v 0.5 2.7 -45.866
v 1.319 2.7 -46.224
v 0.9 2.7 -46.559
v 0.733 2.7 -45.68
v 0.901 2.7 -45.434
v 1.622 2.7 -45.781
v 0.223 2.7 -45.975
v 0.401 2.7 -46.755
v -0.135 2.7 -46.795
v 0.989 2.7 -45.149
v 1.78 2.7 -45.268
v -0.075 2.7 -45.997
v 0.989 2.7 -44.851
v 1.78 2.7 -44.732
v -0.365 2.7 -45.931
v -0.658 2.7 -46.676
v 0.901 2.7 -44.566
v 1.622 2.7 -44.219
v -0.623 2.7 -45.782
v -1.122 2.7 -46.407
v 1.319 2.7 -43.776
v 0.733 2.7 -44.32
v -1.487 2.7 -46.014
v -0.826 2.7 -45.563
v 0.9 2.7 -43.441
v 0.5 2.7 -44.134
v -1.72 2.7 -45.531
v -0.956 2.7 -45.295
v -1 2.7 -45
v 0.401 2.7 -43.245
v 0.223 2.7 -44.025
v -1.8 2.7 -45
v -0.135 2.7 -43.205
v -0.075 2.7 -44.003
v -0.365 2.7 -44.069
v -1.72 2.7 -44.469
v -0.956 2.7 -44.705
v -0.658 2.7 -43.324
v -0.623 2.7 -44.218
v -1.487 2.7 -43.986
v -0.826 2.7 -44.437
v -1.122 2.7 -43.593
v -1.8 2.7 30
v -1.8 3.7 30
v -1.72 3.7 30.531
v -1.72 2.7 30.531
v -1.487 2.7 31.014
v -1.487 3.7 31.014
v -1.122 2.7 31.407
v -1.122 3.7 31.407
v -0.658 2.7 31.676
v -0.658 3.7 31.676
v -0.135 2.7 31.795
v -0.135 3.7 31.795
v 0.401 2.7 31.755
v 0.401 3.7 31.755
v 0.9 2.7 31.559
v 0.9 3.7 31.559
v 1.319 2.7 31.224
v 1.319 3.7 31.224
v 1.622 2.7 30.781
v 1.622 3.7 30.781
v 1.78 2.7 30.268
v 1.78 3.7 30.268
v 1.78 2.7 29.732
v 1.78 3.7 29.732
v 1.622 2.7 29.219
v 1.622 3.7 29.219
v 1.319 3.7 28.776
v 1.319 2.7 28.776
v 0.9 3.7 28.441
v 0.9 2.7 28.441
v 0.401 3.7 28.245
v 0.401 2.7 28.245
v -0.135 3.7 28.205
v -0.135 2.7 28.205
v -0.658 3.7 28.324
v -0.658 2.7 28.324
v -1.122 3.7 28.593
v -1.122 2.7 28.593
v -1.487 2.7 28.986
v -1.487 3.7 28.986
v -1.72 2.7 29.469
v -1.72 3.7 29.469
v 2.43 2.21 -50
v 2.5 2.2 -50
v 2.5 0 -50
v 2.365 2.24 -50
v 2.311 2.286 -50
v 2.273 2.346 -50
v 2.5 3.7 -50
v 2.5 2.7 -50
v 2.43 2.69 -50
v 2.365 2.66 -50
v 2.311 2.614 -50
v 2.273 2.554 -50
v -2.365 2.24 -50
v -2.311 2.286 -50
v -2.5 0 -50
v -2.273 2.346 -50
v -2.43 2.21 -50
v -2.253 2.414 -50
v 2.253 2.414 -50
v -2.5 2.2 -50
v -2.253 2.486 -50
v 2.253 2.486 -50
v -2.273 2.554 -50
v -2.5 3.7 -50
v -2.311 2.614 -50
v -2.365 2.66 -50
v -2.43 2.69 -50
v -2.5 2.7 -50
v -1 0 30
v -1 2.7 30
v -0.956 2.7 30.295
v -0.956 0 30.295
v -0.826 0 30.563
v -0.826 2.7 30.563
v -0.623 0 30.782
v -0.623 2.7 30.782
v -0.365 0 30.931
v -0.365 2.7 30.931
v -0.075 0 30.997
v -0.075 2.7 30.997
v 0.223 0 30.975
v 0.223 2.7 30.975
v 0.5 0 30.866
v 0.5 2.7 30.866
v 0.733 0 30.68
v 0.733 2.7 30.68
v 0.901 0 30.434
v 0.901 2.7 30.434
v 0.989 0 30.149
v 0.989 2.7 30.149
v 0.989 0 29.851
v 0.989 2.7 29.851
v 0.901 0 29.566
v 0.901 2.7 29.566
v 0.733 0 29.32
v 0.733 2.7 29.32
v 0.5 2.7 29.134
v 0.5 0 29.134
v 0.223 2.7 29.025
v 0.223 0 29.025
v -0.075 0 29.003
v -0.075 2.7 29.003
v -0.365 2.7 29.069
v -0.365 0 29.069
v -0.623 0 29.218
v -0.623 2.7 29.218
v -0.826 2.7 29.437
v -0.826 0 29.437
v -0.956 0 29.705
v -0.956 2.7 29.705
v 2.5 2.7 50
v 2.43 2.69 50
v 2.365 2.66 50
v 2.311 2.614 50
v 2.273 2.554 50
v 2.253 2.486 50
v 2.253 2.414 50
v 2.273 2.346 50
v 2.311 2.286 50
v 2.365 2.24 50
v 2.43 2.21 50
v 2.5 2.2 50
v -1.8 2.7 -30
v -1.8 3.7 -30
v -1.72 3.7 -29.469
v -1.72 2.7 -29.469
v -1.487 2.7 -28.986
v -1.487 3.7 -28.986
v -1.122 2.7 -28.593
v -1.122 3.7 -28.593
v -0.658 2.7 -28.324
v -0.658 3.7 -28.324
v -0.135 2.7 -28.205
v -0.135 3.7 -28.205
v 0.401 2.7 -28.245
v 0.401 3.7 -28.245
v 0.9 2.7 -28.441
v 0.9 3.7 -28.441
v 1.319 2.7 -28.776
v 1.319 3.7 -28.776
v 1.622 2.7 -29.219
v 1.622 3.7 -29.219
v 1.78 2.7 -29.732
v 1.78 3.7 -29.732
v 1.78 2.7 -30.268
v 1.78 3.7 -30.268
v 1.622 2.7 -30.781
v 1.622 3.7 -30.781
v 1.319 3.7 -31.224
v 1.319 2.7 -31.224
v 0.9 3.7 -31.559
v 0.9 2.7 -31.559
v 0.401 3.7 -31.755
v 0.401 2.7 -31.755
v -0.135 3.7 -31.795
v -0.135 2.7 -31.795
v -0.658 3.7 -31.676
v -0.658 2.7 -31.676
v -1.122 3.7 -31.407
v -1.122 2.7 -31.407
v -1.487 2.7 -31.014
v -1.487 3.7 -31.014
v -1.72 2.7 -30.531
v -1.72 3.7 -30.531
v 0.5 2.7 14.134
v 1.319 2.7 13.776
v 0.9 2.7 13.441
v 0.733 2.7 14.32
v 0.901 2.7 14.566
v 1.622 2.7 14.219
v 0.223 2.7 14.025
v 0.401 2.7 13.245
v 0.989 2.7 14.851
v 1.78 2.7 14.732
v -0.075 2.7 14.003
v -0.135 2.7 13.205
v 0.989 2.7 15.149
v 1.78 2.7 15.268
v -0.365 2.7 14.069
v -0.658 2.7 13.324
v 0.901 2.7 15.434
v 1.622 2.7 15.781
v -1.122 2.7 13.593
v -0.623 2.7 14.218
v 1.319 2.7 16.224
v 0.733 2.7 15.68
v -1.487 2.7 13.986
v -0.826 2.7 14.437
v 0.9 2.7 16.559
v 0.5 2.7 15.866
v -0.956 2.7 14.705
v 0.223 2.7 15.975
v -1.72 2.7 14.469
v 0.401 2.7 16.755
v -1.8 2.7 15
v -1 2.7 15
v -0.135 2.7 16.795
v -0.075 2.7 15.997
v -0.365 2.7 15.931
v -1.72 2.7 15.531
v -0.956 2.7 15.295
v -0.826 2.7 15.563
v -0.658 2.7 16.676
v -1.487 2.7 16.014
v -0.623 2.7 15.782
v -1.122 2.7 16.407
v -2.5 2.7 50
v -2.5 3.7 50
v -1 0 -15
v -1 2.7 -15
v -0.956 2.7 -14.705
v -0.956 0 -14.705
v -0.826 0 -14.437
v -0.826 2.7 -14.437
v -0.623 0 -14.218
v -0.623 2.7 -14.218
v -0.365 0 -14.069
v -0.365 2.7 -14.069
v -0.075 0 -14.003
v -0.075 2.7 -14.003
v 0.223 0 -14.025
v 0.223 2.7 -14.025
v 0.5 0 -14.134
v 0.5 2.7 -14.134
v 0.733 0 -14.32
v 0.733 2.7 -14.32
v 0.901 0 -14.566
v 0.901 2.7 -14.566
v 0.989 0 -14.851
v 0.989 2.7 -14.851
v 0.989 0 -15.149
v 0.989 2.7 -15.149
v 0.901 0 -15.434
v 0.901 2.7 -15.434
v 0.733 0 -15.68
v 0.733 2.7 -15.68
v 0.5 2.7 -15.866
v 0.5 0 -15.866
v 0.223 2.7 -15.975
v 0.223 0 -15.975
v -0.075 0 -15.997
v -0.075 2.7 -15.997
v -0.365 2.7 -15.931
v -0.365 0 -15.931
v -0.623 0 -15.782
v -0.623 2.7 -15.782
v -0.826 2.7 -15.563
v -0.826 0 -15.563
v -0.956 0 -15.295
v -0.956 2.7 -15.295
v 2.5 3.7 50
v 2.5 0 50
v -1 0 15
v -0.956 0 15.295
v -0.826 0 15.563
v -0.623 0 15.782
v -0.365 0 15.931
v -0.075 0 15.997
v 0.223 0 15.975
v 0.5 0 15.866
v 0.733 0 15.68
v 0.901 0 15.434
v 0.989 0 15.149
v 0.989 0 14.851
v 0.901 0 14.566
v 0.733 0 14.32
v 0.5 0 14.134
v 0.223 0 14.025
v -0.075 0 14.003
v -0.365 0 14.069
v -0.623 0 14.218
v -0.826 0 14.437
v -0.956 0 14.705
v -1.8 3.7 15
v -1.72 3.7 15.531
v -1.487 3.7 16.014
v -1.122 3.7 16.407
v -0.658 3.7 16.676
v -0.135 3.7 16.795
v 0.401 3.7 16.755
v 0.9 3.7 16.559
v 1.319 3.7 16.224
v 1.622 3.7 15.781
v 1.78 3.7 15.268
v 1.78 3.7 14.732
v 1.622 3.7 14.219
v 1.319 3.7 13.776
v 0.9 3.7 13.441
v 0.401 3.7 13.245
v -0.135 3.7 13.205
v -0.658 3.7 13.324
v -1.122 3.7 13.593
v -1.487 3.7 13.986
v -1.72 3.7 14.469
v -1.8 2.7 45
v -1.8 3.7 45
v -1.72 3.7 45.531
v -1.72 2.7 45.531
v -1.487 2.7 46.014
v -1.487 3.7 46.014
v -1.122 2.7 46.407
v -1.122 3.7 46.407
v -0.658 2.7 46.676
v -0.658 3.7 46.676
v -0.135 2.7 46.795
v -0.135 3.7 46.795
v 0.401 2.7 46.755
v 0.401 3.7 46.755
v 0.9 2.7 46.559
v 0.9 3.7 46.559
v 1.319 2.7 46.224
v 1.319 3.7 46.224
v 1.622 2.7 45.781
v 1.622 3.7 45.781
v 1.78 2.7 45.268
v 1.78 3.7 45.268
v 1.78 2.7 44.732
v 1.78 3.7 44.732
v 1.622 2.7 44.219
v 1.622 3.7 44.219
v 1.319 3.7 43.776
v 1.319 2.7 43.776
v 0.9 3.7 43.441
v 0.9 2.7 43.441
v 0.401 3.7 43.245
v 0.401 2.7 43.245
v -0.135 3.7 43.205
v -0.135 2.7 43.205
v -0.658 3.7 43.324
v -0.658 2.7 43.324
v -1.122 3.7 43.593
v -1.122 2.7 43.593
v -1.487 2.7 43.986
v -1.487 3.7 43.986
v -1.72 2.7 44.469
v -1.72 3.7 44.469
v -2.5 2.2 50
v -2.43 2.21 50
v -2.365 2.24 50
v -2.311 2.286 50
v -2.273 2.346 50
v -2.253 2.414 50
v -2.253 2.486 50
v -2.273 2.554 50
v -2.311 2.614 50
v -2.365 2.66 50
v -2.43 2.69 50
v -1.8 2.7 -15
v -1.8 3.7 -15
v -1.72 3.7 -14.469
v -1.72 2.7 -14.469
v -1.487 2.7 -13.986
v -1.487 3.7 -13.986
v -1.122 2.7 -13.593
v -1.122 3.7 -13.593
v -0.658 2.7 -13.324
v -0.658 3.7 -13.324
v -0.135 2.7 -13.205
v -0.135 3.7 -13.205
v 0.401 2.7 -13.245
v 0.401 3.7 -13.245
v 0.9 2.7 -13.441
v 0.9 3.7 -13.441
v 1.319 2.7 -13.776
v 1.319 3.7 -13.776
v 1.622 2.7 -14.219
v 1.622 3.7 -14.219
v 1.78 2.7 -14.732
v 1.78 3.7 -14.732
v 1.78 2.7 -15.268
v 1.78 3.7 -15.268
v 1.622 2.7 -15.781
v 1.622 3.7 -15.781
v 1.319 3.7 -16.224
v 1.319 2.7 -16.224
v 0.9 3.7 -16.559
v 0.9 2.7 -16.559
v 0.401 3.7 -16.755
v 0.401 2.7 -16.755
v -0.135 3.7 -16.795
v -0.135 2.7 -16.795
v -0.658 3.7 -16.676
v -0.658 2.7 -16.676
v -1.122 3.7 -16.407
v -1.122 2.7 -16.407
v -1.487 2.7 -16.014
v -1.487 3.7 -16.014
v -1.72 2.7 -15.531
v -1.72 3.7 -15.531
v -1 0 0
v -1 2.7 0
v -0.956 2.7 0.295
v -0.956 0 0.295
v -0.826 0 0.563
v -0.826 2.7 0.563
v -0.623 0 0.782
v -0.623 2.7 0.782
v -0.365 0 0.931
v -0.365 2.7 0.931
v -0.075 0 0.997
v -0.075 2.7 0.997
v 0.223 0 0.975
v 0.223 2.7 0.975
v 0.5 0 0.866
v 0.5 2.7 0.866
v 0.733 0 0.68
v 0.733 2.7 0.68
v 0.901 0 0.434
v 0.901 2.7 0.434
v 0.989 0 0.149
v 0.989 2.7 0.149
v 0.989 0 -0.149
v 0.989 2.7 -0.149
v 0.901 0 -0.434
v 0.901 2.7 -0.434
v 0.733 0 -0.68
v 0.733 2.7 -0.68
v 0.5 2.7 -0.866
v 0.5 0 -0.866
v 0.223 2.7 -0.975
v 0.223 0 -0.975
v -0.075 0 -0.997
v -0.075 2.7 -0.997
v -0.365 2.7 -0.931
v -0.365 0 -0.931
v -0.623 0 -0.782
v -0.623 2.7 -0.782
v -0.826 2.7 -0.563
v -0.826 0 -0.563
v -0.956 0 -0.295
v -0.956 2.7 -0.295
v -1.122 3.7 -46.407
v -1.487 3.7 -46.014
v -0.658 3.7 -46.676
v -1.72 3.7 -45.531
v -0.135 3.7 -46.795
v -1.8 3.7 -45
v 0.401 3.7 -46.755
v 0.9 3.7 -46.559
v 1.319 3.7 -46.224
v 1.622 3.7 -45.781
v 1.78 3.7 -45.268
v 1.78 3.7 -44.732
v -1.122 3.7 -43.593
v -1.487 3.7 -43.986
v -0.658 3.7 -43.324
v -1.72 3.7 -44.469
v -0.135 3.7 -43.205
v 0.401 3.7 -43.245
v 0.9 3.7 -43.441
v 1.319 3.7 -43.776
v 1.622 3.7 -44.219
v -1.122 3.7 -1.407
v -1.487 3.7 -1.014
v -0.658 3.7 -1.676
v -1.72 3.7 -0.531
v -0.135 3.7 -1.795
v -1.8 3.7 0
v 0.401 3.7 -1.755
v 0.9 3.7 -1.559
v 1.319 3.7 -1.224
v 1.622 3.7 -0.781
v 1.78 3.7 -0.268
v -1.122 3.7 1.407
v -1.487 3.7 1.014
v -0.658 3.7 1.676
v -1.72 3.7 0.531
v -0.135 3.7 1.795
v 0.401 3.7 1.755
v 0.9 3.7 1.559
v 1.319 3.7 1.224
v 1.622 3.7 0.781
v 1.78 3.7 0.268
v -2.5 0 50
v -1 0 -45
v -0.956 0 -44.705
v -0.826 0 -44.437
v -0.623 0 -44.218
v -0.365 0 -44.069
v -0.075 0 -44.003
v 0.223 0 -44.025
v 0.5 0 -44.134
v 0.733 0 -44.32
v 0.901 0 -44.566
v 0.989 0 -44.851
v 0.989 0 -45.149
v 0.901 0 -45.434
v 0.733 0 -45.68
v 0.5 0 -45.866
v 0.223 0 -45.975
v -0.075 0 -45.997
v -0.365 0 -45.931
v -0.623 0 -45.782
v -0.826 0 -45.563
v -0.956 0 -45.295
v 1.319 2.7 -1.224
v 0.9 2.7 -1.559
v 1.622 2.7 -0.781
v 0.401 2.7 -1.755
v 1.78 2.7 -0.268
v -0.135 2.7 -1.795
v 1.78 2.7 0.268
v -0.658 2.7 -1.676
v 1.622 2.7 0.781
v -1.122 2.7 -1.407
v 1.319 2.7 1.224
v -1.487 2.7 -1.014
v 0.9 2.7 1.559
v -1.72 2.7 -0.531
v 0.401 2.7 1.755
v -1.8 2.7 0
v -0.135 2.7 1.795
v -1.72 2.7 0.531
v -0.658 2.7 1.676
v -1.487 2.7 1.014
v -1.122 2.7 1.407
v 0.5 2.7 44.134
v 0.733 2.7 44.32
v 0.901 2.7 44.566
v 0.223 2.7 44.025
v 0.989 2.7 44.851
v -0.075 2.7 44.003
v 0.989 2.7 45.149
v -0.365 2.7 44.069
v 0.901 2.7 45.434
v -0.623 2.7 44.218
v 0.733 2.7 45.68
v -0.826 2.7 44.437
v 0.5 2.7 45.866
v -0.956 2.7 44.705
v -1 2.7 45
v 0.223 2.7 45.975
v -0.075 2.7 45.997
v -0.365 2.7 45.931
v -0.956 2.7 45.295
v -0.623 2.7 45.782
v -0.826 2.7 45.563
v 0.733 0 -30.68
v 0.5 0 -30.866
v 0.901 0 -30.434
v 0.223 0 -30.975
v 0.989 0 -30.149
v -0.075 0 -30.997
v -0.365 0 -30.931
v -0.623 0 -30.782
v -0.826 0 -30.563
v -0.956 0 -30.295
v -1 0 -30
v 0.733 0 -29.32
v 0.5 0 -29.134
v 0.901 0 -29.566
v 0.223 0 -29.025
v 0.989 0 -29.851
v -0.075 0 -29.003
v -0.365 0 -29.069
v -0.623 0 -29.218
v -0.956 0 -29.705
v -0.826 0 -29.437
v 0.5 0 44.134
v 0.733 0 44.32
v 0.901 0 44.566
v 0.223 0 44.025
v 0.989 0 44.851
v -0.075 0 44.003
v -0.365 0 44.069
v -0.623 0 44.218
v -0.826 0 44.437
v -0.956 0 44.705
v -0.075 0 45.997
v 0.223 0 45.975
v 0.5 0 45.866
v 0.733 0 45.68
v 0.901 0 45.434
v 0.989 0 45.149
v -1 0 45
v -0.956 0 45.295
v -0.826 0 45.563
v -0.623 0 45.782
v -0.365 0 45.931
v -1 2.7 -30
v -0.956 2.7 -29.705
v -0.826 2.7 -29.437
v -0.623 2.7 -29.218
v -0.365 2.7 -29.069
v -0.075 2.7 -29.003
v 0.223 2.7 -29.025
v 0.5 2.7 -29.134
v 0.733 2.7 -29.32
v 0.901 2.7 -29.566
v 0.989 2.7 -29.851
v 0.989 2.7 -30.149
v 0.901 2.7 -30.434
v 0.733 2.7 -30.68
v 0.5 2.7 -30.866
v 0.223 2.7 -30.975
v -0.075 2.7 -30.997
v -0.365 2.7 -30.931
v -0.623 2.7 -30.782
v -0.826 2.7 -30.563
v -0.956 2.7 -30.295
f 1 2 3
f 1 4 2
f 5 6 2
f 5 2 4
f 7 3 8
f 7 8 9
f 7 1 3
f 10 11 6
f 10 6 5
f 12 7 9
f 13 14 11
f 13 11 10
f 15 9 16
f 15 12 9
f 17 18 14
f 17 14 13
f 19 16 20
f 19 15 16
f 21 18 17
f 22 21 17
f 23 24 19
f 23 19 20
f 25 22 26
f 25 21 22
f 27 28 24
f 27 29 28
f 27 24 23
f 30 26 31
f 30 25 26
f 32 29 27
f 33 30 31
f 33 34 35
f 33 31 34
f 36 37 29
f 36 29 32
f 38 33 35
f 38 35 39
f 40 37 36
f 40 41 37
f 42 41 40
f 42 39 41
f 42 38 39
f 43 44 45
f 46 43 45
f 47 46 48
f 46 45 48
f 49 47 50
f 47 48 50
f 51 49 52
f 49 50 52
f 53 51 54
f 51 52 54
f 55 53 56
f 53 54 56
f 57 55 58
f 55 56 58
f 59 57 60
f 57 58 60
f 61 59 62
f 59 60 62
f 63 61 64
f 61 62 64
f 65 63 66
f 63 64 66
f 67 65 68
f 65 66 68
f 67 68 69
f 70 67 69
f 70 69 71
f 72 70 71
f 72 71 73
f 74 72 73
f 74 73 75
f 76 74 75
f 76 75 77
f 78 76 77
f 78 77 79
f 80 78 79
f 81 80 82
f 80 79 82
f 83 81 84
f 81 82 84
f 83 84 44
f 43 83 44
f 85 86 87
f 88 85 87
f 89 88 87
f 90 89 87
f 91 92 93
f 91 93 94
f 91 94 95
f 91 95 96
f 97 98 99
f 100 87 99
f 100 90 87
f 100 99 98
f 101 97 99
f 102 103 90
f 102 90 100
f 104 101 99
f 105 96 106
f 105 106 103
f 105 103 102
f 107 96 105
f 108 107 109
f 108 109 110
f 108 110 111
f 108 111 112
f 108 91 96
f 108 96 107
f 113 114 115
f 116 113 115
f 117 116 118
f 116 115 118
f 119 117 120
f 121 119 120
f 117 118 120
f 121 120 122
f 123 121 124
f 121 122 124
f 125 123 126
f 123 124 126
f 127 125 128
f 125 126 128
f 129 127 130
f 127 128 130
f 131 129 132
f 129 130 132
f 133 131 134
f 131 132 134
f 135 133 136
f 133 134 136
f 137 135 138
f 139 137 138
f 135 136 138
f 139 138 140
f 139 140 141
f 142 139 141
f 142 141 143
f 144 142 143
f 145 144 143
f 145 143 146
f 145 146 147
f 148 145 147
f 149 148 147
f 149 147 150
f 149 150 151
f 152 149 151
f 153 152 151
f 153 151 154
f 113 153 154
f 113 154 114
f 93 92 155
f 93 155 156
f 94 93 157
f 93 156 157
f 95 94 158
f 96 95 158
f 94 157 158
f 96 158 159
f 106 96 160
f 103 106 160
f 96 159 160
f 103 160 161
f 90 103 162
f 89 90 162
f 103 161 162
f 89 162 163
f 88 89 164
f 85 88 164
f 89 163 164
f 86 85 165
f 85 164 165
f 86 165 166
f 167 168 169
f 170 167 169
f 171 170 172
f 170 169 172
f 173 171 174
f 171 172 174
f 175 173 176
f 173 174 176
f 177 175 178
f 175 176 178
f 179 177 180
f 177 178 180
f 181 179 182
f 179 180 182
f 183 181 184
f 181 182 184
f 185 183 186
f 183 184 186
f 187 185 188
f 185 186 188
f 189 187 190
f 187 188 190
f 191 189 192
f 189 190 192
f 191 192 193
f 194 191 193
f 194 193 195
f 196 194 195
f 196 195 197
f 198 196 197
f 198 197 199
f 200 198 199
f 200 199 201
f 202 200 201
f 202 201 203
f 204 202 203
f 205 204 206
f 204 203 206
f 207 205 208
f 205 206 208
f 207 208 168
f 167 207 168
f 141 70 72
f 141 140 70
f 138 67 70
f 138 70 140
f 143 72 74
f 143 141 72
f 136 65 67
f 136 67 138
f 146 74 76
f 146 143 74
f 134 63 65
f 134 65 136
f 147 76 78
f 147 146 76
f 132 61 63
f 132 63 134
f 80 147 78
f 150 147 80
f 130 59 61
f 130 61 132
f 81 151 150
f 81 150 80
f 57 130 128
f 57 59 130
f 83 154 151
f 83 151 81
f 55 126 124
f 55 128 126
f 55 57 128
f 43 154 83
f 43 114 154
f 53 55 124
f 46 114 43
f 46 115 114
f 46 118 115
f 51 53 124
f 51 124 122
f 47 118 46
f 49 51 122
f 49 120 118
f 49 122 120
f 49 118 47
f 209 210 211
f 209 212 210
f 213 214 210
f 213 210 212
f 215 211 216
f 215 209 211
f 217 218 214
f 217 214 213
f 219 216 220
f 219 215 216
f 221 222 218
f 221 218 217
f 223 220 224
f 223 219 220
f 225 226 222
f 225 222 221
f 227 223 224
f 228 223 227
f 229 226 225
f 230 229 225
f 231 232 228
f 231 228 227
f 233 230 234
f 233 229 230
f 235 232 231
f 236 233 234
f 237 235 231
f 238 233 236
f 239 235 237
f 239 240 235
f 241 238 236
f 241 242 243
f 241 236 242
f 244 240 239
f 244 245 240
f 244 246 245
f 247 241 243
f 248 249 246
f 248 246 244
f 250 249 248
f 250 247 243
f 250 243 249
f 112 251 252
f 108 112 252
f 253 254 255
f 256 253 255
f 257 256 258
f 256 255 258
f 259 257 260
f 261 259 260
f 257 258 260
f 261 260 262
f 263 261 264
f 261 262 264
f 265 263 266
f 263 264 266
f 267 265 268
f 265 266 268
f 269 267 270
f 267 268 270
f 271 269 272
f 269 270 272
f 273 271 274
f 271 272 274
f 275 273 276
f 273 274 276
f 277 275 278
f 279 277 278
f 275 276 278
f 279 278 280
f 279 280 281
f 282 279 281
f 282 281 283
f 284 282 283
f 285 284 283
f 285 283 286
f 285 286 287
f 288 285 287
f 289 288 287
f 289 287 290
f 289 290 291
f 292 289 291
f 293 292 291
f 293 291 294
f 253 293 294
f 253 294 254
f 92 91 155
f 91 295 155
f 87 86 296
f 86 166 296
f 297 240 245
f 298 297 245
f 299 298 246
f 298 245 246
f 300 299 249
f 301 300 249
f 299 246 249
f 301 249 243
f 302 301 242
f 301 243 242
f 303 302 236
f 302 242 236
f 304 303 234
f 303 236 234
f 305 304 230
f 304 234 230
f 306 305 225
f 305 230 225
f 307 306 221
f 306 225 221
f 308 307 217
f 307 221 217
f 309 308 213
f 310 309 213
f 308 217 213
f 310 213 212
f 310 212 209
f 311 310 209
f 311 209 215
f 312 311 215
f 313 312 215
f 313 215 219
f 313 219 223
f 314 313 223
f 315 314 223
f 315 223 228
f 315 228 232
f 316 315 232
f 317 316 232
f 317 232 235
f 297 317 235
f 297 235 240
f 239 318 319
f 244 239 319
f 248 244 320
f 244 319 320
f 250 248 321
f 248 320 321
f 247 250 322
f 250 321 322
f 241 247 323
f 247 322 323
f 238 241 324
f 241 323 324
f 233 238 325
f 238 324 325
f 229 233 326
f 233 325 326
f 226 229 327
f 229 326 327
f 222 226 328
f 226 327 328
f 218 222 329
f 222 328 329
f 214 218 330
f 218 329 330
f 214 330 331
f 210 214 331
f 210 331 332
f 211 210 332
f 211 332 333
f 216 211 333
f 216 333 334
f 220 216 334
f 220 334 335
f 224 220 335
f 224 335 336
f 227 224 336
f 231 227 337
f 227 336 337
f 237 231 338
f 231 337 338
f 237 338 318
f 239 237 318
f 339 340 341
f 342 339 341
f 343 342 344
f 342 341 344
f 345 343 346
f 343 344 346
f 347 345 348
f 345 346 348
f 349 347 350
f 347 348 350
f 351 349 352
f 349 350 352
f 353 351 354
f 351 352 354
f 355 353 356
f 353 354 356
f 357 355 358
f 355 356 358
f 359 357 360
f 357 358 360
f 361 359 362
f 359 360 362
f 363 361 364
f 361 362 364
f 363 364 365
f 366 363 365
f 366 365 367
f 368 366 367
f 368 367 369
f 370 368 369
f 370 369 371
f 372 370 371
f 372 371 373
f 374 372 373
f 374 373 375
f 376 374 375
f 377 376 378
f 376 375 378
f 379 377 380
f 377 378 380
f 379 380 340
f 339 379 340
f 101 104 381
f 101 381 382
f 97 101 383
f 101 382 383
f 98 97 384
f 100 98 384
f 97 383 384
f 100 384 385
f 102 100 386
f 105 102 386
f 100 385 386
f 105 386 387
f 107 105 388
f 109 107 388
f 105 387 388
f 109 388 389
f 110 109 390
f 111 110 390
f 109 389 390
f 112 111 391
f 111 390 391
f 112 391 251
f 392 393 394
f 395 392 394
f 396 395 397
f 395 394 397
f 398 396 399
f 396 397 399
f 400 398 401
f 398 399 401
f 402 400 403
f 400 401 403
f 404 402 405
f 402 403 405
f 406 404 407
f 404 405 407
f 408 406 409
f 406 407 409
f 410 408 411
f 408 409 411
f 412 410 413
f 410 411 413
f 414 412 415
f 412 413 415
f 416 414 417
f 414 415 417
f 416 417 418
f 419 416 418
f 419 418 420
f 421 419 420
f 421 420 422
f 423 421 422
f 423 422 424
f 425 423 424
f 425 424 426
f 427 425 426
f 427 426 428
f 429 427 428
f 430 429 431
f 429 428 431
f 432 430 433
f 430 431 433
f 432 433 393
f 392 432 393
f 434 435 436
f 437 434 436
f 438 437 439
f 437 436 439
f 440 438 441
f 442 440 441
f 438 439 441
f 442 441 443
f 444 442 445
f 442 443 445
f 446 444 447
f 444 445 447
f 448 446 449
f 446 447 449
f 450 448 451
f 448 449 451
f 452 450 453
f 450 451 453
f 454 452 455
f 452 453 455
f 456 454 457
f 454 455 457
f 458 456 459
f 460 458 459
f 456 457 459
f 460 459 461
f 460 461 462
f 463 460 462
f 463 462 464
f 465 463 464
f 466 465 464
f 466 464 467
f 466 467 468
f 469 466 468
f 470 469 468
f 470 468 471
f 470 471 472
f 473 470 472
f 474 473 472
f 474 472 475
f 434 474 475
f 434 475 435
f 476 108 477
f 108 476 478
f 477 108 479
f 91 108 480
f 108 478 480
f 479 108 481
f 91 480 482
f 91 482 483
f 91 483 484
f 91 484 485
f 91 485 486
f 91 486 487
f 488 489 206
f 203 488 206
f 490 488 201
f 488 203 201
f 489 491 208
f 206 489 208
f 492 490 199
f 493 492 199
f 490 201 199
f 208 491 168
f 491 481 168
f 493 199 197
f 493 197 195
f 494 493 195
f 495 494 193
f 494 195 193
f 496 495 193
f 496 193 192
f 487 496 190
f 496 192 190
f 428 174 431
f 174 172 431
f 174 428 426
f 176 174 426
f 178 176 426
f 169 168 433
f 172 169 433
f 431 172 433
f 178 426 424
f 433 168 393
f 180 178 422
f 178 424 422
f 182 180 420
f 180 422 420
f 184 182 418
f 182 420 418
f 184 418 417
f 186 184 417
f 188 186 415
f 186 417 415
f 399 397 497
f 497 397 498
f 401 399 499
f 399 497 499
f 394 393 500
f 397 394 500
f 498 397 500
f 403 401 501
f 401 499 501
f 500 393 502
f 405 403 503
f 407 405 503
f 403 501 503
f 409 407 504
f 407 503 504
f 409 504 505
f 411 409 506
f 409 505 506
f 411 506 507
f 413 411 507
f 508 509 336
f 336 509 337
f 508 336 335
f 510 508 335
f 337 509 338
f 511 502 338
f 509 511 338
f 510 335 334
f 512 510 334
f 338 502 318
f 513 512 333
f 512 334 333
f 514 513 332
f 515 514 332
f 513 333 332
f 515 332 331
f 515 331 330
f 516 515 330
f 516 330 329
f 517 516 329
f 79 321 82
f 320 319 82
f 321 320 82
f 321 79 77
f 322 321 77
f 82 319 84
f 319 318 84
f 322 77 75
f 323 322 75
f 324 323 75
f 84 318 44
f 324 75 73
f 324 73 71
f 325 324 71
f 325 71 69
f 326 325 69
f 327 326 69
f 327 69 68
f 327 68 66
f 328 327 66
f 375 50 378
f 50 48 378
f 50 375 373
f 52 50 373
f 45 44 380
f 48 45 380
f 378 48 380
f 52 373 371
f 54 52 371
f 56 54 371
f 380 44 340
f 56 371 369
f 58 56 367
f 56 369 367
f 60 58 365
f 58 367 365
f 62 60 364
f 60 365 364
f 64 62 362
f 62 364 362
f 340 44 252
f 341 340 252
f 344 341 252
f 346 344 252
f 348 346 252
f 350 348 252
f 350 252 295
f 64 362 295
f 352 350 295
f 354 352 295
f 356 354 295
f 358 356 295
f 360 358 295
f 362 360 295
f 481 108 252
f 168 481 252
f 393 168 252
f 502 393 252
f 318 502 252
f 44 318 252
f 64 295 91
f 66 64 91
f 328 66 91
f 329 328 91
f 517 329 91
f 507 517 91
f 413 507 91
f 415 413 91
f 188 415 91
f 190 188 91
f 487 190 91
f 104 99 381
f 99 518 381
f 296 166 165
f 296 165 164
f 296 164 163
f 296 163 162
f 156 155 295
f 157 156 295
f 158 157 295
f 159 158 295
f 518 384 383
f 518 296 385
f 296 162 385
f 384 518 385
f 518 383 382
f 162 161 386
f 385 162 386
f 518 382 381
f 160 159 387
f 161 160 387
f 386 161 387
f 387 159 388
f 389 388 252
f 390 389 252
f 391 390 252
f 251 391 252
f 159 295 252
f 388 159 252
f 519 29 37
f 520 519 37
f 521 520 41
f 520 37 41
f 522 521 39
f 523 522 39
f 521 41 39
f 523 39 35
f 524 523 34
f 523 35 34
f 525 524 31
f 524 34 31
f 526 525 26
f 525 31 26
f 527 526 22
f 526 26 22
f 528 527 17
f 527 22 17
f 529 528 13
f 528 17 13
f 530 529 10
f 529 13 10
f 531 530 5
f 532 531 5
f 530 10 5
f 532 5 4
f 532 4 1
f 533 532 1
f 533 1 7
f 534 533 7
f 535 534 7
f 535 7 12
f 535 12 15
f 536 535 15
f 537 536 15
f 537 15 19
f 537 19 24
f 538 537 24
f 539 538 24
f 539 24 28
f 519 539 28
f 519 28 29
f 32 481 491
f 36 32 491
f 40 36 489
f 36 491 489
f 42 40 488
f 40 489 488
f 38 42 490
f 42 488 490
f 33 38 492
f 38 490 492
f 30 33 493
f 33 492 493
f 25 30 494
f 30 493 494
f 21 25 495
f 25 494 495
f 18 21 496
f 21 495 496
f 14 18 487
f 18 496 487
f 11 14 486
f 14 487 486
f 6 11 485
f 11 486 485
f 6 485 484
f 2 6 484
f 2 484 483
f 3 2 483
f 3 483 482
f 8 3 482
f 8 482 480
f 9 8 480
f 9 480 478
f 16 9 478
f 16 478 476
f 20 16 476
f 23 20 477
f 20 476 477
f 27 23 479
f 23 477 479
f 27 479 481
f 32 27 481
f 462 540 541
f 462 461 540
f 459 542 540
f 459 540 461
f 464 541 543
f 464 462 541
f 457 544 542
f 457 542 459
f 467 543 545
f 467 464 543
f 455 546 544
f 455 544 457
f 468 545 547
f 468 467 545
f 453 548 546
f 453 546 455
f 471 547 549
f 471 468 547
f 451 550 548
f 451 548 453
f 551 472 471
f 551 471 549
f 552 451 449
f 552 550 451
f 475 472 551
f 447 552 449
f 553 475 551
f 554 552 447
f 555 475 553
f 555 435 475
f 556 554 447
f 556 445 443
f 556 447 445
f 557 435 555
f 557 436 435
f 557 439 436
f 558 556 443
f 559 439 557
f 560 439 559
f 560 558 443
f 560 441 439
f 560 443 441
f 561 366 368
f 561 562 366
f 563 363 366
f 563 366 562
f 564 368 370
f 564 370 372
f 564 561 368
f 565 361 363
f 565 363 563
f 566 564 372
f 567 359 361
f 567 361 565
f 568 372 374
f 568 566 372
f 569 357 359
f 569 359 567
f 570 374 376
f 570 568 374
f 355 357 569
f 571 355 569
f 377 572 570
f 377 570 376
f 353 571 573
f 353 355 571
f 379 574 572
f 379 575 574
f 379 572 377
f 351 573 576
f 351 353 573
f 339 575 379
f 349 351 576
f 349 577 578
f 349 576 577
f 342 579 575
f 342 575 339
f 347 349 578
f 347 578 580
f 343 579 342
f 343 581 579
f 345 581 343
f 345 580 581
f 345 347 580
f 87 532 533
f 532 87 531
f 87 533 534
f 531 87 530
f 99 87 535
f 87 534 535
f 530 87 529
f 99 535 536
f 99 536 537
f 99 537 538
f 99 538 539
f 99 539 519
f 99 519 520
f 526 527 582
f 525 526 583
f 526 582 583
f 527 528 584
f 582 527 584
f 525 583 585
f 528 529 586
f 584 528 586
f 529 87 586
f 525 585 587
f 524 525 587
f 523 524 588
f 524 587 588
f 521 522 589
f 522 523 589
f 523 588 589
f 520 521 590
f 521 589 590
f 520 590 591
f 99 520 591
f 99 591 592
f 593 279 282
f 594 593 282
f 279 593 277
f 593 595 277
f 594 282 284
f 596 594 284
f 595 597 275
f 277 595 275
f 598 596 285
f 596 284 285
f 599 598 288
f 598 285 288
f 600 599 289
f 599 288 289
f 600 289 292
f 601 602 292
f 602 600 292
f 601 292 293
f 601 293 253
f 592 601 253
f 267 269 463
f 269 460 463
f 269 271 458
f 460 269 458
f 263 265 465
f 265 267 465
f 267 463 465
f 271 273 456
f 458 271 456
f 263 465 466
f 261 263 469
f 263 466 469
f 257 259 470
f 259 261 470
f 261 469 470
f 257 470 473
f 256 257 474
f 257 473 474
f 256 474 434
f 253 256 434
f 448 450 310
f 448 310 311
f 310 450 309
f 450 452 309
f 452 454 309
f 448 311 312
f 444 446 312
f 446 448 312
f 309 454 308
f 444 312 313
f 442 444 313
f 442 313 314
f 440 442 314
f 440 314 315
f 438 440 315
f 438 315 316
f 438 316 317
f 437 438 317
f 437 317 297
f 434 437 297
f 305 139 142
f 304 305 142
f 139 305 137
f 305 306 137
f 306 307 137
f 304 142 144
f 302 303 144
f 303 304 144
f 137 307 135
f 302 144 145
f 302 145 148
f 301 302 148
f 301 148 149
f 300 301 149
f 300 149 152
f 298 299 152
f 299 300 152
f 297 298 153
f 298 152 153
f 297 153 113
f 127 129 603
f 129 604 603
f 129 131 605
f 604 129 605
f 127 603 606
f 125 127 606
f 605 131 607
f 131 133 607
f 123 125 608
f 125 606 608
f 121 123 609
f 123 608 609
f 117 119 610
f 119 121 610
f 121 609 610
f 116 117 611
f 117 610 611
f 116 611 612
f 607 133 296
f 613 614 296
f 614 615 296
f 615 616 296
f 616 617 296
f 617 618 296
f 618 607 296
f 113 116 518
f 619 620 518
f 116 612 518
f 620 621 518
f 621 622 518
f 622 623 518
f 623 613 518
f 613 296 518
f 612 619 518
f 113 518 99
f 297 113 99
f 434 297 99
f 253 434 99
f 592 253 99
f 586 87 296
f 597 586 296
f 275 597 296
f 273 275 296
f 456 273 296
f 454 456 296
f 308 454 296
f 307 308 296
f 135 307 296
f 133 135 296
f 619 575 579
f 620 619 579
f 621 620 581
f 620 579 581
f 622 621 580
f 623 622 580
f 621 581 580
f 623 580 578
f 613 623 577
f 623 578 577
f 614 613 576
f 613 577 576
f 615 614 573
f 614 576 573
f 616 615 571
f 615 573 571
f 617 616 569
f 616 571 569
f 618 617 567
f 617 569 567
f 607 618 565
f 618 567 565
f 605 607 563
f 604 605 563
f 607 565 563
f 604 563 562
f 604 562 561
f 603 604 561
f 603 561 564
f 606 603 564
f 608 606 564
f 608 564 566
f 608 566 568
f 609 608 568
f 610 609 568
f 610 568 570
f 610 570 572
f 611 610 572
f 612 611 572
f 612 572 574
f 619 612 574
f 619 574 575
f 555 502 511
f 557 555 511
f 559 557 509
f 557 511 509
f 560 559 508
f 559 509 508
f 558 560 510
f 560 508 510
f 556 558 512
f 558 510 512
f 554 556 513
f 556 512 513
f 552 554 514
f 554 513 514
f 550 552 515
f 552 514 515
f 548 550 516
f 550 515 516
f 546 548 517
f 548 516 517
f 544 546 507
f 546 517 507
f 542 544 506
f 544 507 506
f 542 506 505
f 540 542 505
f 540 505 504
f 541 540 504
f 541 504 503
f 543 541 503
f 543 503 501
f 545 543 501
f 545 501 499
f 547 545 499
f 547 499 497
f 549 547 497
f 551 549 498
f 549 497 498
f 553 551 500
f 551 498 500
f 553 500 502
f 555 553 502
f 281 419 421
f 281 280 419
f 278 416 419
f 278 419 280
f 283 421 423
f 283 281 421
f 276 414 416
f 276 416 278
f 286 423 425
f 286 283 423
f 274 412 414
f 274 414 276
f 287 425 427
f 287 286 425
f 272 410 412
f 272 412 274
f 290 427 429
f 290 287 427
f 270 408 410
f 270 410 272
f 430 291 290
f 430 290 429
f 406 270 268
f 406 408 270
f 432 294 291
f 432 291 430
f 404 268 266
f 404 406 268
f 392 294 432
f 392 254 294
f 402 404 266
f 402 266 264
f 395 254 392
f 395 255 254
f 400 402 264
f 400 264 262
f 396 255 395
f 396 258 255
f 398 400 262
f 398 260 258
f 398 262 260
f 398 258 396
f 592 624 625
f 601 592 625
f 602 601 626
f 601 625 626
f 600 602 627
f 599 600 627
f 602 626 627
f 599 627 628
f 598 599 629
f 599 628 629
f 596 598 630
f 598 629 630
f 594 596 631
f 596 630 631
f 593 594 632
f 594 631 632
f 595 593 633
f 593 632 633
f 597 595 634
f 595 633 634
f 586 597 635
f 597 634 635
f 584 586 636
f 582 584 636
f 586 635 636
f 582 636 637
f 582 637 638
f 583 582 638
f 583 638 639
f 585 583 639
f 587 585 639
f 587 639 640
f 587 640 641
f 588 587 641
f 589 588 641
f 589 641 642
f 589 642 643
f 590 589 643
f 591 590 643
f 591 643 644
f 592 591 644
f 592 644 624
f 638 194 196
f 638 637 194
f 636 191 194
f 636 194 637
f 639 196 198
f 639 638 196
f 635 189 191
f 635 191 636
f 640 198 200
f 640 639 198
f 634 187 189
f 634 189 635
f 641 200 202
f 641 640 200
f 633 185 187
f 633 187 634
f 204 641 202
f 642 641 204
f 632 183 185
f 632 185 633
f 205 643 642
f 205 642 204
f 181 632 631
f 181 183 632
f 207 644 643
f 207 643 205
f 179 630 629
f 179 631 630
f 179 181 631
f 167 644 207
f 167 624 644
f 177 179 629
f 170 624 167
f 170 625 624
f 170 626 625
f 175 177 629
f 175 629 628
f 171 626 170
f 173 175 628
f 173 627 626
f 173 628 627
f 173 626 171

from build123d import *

# Parameters (mm, degrees)
BOSS_EXTRUDE1_DEPTH = 50
SKETCH2_R           = 1.8
CUT_EXTRUDE1_DEPTH  = 1
SKETCH3_R           = 1
CUT_EXTRUDE3_DEPTH  = 51.199003974
LPATTERN1_COUNT     = 7
LPATTERN1_PITCH     = 15
LPATTERN2_COUNT     = 7
LPATTERN2_PITCH     = 15


with BuildPart() as part:
    # Sketch1 → Boss-Extrude1 (new, symmetric)
    with BuildSketch(Plane.XY):
        with BuildLine():
            Line((-2.5, 3.7), (2.5, 3.7))
            Line((2.5, 3.7), (2.5, 2.7))
            ThreePointArc((2.5, 2.7), (2.25, 2.45), (2.5, 2.2))
            Line((2.5, 2.2), (2.5, 0))
            Line((2.5, 0), (-2.5, 0))
            Line((-2.5, 0), (-2.5, 2.2))
            ThreePointArc((-2.5, 2.2), (-2.25, 2.45), (-2.5, 2.7))
            Line((-2.5, 2.7), (-2.5, 3.7))
        make_face()
    extrude(amount=BOSS_EXTRUDE1_DEPTH, both=True)

    # Sketch2 → Cut-Extrude1 (cut)
    with BuildSketch(Plane(origin=(0, 3.7, 0), x_dir=(1, 0, 0), z_dir=(0, 1, 0))):
        with Locations(Location((0, 0, 0), (0, 0, 180))):
            Circle(SKETCH2_R)
    cut_extrude1 = extrude(amount=-CUT_EXTRUDE1_DEPTH, mode=Mode.SUBTRACT)

    # Sketch3 → Cut-Extrude3 (cut, through all)
    with BuildSketch(Plane(origin=(0, 3.7, 0), x_dir=(1, 0, 0), z_dir=(0, 1, 0))):
        with Locations(Location((0, 0, 0), (0, 0, 180))):
            Circle(SKETCH3_R)
    cut_extrude3 = extrude(amount=-CUT_EXTRUDE3_DEPTH, mode=Mode.SUBTRACT)

    # LPattern1: Cut-Extrude1, Cut-Extrude3 ×7
    with Locations(*[(0, 0, -i * LPATTERN1_PITCH) for i in range(1, LPATTERN1_COUNT)]):
        add(cut_extrude1, mode=Mode.SUBTRACT)
        add(cut_extrude3, mode=Mode.SUBTRACT)

    # LPattern2: Cut-Extrude1, Cut-Extrude3 ×7
    with Locations(*[(0, 0, i * LPATTERN2_PITCH) for i in range(1, LPATTERN2_COUNT)]):
        add(cut_extrude1, mode=Mode.SUBTRACT)
        add(cut_extrude3, mode=Mode.SUBTRACT)


solid = part.part
